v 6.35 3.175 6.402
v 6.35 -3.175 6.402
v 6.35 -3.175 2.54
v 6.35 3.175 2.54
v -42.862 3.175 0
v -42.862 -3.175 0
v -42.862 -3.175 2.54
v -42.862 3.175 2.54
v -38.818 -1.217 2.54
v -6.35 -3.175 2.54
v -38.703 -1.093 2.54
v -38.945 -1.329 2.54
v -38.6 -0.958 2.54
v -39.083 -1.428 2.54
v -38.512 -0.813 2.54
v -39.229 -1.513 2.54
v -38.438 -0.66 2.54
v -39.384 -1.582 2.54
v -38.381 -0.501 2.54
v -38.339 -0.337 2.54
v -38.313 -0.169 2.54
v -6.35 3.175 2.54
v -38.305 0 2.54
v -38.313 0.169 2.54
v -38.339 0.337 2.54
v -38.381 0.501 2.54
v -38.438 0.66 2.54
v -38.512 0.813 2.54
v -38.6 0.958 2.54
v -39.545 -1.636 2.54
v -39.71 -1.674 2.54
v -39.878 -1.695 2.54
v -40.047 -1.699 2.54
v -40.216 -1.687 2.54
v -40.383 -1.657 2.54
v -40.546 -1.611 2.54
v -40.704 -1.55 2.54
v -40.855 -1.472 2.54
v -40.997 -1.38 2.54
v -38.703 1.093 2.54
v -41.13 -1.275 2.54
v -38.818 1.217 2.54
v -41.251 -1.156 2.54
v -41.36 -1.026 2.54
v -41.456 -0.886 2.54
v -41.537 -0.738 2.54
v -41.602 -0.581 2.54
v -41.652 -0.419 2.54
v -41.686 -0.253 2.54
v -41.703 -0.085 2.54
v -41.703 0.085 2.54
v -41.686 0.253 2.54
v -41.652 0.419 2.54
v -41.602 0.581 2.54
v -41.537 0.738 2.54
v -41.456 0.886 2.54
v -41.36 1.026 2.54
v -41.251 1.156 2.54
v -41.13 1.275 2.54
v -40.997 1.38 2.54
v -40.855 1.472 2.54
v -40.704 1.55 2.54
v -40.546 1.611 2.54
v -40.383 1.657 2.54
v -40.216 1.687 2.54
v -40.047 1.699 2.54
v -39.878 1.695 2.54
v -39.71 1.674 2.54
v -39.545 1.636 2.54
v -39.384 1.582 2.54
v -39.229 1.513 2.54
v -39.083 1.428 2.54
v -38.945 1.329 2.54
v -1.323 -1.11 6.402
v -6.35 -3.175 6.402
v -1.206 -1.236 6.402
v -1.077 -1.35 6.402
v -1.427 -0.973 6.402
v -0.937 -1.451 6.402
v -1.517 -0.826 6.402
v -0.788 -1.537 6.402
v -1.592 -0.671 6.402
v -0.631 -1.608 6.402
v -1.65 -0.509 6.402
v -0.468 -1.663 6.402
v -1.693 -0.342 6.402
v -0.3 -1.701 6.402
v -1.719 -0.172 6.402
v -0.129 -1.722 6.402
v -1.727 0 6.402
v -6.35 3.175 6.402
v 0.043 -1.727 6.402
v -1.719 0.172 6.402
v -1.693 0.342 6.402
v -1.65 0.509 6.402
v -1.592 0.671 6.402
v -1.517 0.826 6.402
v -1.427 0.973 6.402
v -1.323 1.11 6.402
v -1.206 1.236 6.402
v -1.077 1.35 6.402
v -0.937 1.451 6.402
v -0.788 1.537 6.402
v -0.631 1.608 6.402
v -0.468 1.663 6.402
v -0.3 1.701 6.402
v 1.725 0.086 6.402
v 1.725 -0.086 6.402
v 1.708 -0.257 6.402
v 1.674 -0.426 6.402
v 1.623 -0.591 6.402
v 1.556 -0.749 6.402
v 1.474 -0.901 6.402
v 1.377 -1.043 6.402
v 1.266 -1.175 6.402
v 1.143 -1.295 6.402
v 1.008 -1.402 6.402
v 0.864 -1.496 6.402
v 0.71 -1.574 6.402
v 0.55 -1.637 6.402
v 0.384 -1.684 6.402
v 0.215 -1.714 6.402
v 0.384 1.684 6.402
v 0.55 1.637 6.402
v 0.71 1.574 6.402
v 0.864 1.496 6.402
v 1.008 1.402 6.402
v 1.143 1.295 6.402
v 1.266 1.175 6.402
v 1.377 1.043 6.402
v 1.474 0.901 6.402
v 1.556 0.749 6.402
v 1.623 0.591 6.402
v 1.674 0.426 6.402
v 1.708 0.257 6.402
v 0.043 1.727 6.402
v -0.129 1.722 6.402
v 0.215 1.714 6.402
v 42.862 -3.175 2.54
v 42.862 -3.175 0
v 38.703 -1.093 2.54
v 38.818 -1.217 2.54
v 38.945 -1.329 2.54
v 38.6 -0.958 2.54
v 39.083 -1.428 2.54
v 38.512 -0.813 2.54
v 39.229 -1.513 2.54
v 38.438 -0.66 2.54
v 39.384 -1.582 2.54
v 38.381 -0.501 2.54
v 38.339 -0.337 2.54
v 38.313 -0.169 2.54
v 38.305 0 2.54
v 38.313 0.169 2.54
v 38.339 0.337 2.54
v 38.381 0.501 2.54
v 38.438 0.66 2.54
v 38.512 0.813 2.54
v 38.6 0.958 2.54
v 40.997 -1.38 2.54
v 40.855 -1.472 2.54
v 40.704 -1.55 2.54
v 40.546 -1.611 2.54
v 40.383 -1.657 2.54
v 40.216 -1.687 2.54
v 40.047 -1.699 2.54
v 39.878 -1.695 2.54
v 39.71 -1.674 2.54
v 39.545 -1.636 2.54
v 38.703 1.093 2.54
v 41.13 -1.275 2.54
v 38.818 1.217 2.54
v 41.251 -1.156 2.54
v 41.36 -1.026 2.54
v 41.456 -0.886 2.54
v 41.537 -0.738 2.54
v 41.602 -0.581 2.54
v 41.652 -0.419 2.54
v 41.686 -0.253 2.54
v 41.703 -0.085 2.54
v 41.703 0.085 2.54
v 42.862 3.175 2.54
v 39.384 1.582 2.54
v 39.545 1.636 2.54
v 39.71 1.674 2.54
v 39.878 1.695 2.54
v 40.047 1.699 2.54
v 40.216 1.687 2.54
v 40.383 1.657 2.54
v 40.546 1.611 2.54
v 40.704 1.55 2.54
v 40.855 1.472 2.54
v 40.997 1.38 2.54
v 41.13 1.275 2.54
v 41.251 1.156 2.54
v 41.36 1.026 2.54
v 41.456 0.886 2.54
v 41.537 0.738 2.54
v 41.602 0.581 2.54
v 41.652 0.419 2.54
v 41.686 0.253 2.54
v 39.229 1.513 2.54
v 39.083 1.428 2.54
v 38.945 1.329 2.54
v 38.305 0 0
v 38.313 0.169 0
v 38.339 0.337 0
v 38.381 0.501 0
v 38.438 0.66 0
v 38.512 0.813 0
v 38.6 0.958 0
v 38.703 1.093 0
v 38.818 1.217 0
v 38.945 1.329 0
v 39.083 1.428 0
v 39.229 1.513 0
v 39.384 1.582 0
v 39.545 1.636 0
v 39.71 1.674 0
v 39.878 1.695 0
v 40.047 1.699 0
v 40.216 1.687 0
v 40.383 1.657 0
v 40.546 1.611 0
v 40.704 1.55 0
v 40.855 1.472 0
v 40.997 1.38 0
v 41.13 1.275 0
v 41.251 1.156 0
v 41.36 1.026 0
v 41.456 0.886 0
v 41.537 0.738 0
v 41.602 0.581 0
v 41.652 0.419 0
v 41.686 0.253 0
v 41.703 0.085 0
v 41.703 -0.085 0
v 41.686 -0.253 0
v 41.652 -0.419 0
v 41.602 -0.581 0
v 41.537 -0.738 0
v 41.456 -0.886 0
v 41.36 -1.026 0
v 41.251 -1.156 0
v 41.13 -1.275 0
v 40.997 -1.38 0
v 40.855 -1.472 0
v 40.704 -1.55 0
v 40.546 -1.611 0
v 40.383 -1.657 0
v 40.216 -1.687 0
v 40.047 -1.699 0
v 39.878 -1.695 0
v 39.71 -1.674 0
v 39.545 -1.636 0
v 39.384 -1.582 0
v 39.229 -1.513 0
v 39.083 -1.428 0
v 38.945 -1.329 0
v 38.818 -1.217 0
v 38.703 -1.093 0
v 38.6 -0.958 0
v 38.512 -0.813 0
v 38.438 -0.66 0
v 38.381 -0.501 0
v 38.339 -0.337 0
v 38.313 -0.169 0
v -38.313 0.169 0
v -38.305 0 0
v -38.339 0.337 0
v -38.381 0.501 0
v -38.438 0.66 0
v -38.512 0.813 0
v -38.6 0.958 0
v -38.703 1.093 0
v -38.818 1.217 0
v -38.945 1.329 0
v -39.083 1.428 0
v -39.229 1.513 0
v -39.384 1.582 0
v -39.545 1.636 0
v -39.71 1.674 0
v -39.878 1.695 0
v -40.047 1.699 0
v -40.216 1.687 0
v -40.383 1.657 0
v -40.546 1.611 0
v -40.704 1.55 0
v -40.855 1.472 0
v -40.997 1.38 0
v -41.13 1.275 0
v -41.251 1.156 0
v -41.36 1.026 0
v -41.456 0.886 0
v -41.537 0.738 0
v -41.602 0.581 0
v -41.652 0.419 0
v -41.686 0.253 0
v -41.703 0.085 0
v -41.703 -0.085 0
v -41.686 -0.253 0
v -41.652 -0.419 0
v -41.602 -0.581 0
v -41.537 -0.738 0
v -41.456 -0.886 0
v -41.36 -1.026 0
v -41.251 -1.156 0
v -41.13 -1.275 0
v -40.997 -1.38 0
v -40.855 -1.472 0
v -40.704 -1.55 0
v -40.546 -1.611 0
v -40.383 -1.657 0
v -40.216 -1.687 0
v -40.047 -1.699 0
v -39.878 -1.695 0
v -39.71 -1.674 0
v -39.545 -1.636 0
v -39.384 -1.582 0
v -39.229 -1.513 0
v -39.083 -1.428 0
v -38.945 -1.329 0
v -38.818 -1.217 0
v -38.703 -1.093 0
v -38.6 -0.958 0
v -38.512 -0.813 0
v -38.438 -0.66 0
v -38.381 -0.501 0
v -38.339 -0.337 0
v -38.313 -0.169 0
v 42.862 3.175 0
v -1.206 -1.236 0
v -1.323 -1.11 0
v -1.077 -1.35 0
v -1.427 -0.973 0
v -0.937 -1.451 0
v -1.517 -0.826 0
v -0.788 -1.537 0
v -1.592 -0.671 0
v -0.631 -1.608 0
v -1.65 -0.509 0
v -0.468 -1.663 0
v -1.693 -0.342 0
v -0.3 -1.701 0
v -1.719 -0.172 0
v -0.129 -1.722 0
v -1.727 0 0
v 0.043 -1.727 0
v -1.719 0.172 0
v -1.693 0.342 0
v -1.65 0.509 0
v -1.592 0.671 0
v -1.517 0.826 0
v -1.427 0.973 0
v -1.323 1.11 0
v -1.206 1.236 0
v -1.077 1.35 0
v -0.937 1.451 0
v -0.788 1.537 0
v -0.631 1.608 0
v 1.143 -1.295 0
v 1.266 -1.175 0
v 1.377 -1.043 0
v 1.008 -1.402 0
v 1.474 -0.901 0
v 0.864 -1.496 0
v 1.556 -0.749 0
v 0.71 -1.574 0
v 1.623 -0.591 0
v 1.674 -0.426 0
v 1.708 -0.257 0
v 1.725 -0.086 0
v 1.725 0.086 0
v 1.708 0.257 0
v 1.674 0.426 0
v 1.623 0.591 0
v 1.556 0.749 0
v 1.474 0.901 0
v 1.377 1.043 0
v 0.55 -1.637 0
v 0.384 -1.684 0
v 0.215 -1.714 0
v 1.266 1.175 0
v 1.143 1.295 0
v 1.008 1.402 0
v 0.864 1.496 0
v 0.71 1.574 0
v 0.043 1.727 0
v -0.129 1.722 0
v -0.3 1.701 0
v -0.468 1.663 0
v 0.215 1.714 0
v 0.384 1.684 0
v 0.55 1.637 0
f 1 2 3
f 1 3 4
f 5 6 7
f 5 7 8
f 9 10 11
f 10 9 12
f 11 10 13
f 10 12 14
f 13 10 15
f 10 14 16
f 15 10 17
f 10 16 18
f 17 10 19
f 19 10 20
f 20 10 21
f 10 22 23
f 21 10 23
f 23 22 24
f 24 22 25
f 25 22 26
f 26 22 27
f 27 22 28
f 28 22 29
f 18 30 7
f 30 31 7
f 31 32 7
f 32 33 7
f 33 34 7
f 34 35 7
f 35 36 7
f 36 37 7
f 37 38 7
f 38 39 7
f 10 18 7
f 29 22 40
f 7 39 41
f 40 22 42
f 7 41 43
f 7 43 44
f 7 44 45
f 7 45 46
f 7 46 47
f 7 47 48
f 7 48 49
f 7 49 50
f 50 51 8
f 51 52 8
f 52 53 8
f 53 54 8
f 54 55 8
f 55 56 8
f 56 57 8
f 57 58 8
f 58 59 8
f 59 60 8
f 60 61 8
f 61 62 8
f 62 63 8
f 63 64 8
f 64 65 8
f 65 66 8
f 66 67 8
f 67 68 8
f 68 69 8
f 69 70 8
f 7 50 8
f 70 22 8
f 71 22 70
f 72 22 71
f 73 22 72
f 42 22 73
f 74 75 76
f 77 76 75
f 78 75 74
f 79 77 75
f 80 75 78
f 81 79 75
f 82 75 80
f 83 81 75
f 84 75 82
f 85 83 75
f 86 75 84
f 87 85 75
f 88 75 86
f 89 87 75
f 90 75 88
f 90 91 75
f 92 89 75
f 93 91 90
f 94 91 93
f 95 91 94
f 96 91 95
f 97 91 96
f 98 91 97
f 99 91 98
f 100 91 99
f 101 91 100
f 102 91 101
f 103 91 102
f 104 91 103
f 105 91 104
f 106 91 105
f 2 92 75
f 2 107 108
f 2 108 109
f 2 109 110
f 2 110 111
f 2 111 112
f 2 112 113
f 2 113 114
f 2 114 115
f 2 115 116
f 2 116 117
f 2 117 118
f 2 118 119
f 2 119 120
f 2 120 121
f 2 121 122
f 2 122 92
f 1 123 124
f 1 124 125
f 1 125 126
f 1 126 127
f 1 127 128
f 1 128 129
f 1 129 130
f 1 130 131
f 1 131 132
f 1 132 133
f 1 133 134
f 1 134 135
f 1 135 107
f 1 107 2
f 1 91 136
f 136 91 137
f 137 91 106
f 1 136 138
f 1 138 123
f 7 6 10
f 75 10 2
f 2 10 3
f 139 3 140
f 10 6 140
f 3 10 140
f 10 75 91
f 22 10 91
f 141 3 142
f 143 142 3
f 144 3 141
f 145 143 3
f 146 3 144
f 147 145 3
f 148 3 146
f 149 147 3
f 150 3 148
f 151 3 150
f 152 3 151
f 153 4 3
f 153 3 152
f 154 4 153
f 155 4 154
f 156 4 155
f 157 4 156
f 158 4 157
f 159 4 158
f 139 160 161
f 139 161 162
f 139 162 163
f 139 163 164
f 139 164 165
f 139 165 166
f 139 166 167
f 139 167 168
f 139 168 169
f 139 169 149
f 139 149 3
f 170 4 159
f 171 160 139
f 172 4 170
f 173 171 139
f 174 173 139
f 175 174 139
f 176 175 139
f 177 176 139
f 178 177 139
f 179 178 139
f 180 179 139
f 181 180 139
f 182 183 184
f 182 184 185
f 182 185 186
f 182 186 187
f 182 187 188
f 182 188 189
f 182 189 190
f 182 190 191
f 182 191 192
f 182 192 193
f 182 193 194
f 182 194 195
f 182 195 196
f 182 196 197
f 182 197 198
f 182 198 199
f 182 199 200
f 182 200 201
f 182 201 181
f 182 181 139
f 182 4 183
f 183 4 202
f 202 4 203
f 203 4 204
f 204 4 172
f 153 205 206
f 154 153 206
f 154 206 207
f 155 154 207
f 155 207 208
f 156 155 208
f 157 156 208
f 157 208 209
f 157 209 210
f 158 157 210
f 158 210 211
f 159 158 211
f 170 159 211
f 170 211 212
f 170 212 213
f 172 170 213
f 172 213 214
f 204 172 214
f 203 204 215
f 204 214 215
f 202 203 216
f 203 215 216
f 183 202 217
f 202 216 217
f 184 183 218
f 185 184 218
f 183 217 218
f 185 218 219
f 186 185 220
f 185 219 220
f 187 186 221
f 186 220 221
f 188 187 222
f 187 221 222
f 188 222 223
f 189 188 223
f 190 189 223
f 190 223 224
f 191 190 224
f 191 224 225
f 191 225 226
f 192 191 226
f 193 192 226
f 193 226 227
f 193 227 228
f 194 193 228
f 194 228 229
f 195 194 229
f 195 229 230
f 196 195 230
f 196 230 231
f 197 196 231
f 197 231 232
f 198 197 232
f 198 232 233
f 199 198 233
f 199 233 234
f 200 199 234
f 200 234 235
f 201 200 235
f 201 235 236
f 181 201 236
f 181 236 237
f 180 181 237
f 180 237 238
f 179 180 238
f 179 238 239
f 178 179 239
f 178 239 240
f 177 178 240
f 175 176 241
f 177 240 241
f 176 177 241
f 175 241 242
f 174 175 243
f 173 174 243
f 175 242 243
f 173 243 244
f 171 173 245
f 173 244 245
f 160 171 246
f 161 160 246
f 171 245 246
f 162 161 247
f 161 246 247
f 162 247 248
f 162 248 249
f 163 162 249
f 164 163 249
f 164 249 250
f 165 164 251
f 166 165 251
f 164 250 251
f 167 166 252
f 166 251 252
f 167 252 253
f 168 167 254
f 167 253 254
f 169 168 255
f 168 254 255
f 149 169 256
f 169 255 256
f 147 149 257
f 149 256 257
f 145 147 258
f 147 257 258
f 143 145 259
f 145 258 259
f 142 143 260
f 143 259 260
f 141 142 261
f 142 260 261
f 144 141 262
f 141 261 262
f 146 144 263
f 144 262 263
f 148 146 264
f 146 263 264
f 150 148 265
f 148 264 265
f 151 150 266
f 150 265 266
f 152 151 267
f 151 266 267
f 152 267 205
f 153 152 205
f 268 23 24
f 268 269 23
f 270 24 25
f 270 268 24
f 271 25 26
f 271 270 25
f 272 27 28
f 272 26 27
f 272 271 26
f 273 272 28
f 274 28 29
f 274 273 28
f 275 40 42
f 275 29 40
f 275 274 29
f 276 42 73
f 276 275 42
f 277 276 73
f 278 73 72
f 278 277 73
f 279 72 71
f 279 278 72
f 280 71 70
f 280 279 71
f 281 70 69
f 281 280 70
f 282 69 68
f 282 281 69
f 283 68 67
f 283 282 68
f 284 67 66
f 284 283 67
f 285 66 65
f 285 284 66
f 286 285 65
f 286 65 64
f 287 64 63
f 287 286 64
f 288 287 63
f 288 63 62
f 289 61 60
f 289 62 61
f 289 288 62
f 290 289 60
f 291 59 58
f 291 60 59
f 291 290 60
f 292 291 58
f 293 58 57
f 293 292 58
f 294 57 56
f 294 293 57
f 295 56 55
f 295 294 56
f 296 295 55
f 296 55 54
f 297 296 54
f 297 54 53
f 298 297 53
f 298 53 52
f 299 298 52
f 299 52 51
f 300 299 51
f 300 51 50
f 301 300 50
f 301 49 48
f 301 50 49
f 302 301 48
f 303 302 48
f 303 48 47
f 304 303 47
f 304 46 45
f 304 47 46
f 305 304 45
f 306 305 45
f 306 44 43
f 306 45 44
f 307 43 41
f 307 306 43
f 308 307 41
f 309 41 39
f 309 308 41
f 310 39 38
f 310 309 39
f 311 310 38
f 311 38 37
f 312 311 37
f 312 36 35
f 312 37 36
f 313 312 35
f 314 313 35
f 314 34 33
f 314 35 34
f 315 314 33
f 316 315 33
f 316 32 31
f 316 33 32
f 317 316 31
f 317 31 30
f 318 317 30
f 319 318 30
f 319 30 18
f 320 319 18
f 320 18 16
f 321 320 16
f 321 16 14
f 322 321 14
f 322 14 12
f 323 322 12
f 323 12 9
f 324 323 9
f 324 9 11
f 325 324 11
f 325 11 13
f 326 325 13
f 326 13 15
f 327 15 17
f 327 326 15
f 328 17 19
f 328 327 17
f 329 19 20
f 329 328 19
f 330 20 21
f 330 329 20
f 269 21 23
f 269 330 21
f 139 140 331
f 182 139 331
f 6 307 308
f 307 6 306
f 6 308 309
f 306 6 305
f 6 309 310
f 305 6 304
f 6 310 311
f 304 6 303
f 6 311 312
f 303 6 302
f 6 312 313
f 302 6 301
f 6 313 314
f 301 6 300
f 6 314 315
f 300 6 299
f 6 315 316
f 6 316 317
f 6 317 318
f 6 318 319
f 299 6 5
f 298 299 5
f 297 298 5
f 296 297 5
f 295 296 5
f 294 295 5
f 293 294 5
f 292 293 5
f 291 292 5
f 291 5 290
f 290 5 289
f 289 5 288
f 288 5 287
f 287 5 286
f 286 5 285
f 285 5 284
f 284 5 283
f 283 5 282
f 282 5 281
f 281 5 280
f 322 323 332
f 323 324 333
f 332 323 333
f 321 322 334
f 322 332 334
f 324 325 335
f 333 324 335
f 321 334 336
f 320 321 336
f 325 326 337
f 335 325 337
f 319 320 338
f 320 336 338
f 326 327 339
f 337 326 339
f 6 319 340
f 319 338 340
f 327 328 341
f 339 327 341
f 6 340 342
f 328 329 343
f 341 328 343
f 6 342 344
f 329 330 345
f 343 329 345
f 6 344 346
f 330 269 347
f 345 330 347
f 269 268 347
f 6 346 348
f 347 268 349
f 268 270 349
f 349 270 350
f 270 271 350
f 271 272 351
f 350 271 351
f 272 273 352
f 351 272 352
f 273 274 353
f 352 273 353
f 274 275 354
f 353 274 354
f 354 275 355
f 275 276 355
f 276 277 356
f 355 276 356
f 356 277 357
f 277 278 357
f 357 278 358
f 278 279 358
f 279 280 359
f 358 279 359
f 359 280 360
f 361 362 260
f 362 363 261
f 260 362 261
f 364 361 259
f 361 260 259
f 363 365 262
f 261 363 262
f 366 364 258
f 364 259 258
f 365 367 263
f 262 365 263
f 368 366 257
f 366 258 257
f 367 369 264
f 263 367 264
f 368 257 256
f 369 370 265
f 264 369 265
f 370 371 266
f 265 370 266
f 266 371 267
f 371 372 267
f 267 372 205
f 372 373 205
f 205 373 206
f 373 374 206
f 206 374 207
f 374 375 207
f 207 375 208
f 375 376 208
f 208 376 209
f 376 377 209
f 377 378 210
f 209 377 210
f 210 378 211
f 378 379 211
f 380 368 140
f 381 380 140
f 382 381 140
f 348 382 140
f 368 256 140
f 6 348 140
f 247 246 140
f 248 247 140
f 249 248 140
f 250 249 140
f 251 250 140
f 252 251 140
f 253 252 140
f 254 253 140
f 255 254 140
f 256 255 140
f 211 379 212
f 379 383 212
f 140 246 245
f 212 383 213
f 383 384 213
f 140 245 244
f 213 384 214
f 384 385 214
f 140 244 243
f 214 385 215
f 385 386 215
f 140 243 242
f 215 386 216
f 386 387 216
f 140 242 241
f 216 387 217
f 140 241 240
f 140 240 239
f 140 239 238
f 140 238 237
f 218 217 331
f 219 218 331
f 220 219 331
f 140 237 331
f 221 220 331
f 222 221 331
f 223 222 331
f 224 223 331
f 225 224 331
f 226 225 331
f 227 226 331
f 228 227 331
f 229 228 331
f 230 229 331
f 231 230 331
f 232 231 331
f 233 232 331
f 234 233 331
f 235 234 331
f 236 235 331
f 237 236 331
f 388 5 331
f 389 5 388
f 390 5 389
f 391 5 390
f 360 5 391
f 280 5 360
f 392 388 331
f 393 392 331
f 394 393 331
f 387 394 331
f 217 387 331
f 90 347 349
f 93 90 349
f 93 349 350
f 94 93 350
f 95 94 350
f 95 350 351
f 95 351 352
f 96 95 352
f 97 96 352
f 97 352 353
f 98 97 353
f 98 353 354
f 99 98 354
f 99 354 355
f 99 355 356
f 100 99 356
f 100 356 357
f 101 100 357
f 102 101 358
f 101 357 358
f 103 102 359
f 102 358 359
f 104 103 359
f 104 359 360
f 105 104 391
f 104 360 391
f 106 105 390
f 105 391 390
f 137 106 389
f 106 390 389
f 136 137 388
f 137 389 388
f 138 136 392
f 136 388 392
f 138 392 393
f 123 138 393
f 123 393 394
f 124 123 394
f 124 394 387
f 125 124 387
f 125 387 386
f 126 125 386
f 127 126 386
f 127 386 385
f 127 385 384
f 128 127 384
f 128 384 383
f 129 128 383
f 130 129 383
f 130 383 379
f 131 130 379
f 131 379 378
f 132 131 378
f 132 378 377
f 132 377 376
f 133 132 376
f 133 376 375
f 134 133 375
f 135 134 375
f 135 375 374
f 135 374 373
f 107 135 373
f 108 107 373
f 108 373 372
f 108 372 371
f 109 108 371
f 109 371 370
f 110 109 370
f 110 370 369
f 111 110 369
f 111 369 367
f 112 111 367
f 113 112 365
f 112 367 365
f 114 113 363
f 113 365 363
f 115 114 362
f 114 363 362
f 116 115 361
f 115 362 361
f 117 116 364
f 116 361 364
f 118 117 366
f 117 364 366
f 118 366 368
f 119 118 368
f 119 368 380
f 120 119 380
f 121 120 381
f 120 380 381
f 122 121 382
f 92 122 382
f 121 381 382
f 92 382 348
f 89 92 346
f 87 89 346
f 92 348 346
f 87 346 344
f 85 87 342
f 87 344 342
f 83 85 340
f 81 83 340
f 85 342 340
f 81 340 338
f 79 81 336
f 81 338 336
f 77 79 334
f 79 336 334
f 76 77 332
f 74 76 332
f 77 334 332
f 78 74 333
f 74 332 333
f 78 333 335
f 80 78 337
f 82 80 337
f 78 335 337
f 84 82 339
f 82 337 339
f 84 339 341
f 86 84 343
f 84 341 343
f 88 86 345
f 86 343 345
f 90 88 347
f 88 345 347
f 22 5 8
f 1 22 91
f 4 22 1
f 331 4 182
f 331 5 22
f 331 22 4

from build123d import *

# Parameters (mm, degrees)
SKETCH1_W             = 85.725
SKETCH1_H             = 6.35
BOSS_EXTRUDE1_DEPTH   = 6.40182
SKETCH2_W             = 36.5125
SKETCH2_H             = 6.35
CUT_EXTRUDE1_DEPTH    = 3.86182
M3_CLEARANCE_HOLE1_D  = 3.4
F_8_32_TAPPED_HOLE1_D = 3.4544


with BuildPart() as part:
    # Sketch1 → Boss-Extrude1 (new body)
    with BuildSketch(Plane.XY):
        Rectangle(SKETCH1_W, SKETCH1_H)
    extrude(amount=BOSS_EXTRUDE1_DEPTH)

    # Sketch2 → Cut-Extrude1 (cut)
    with BuildSketch(Plane.XY.offset(6.40182)):
        with Locations((24.60625, 0)):
            Rectangle(SKETCH2_W, SKETCH2_H)
    cut_extrude1 = extrude(amount=-CUT_EXTRUDE1_DEPTH, mode=Mode.SUBTRACT)

    # M3 Clearance Hole1 (through all)
    with Locations(Plane.XY.offset(2.54)):
        with Locations((40.005, 0)):
            m3_clearance_hole1 = Hole(M3_CLEARANCE_HOLE1_D / 2)

    # Mirror2: Cut-Extrude1, M3 Clearance Hole1 across plane
    add(cut_extrude1.mirror(Plane(origin=(0, 0, 0), x_dir=(0, 0, 1), z_dir=(1, 0, 0))), mode=Mode.SUBTRACT)
    add(m3_clearance_hole1.mirror(Plane(origin=(0, 0, 0), x_dir=(0, 0, 1), z_dir=(1, 0, 0))), mode=Mode.SUBTRACT)

    # #8-32 Tapped Hole1 (through all)
    with Locations(Plane.XY.offset(6.40182)):
        with Locations((0, 0)):
            Hole(F_8_32_TAPPED_HOLE1_D / 2)


solid = part.part
